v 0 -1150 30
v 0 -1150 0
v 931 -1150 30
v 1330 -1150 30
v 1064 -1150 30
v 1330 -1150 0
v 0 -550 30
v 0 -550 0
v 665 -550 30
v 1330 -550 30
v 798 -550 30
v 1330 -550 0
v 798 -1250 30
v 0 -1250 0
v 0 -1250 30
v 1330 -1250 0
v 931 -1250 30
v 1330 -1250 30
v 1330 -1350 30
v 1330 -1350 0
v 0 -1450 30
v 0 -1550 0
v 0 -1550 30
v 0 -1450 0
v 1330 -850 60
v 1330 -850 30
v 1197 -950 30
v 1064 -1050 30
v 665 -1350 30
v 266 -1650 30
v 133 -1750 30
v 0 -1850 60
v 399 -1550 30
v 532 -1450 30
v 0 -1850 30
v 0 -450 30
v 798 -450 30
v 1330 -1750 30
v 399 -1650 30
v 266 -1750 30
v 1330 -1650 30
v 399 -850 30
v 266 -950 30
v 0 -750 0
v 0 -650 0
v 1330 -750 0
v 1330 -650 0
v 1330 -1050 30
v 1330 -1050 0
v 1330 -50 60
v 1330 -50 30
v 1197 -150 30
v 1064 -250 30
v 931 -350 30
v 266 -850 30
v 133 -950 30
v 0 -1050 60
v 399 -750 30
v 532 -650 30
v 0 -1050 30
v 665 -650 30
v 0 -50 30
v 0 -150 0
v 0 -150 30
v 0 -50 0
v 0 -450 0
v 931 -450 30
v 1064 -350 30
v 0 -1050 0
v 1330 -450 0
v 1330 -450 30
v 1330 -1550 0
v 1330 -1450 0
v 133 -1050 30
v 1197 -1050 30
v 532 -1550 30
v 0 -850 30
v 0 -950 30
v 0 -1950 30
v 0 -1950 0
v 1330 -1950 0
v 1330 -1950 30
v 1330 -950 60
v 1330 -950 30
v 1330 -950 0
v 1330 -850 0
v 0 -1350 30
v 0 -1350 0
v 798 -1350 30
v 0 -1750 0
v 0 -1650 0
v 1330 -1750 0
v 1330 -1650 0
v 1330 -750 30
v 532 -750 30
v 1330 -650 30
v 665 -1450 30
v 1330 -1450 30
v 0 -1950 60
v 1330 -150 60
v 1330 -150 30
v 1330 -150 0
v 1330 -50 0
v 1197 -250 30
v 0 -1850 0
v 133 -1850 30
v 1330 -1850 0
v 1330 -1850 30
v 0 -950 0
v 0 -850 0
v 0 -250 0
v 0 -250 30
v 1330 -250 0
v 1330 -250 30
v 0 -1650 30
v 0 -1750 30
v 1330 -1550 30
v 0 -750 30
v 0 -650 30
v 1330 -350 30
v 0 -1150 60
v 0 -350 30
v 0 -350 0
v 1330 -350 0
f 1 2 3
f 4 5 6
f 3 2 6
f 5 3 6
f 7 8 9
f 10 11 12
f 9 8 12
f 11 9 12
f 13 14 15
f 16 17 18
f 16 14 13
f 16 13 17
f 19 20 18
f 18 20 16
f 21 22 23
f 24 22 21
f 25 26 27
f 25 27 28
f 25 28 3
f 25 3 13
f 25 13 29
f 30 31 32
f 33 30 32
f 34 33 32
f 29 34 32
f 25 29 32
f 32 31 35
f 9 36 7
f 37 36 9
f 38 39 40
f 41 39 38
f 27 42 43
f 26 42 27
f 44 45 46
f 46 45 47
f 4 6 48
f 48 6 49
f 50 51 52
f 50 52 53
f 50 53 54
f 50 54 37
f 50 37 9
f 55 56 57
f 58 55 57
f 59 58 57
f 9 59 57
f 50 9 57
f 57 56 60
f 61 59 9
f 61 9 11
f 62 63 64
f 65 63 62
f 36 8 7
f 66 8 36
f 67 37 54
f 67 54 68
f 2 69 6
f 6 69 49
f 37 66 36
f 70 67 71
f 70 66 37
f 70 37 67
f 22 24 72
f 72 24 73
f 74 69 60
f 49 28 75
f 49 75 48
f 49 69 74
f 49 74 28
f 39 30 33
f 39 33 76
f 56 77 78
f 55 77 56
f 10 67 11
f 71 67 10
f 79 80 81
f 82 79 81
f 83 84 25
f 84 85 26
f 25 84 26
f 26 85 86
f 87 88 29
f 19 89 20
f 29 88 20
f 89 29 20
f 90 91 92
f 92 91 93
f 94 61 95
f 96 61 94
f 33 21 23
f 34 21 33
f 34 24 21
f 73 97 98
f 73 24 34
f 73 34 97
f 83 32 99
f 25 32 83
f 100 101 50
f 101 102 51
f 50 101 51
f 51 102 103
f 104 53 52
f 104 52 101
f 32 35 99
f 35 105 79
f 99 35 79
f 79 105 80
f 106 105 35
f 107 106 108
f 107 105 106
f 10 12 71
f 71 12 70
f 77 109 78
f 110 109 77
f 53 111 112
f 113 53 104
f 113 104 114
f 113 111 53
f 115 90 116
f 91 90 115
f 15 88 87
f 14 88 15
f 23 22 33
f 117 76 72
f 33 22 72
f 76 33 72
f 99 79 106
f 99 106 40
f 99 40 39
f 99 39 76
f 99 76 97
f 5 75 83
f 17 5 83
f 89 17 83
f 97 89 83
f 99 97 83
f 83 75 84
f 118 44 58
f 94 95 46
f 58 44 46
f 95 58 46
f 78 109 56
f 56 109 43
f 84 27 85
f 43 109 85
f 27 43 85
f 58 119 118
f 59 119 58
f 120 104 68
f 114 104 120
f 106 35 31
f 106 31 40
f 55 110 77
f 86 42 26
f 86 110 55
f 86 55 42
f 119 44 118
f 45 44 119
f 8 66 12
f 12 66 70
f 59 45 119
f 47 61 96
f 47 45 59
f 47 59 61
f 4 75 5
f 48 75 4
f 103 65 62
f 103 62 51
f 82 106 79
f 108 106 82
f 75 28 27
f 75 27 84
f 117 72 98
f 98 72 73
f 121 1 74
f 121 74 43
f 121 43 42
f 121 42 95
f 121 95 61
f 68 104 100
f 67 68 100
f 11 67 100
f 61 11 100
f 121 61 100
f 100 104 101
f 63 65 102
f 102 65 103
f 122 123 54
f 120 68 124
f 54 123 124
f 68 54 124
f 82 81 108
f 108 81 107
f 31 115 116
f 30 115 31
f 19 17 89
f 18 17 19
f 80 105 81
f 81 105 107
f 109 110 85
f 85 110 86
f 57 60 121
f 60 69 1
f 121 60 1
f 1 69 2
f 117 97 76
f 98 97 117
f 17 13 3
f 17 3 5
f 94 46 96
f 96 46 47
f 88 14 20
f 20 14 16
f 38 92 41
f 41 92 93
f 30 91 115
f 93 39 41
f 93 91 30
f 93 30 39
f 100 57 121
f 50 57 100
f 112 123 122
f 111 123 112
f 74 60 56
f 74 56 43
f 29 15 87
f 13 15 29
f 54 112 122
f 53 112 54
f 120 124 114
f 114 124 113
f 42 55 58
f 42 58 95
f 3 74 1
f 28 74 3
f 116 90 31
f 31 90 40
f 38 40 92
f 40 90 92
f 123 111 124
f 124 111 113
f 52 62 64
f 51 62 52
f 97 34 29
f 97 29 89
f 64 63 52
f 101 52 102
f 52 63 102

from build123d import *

# Parameters (mm, degrees)
SKETCH1_W              = 1330
SKETCH1_H              = 100
BOSS_EXTRUDE1_DEPTH    = 30
BOSS_EXTRUDE1_2_DEPTH  = 30
BOSS_EXTRUDE1_3_DEPTH  = 30
BOSS_EXTRUDE1_4_DEPTH  = 30
BOSS_EXTRUDE1_5_DEPTH  = 30
BOSS_EXTRUDE1_6_DEPTH  = 30
BOSS_EXTRUDE1_7_DEPTH  = 30
BOSS_EXTRUDE1_8_DEPTH  = 30
BOSS_EXTRUDE1_9_DEPTH  = 30
BOSS_EXTRUDE1_10_DEPTH = 30
BOSS_EXTRUDE2_DEPTH    = 30


with BuildPart() as part:
    # Sketch1 → Boss-Extrude1 (new body)
    with BuildSketch(Plane.XY):
        with Locations((665, -500)):
            Rectangle(SKETCH1_W, SKETCH1_H)
    extrude(amount=BOSS_EXTRUDE1_DEPTH)



with BuildPart() as body_2:
    # Sketch1 → Boss-Extrude1 2 (new body)
    with BuildSketch(Plane.XY):
        with Locations((665, -700)):
            Rectangle(SKETCH1_W, SKETCH1_H)
    extrude(amount=BOSS_EXTRUDE1_2_DEPTH)


with BuildPart() as body_3:
    # Sketch1 → Boss-Extrude1 3 (new body)
    with BuildSketch(Plane.XY):
        with Locations((665, -900)):
            Rectangle(SKETCH1_W, SKETCH1_H)
    extrude(amount=BOSS_EXTRUDE1_3_DEPTH)


with BuildPart() as body_4:
    # Sketch1 → Boss-Extrude1 4 (new body)
    with BuildSketch(Plane.XY):
        with Locations((665, -1100)):
            Rectangle(SKETCH1_W, SKETCH1_H)
    extrude(amount=BOSS_EXTRUDE1_4_DEPTH)


with BuildPart() as body_5:
    # Sketch1 → Boss-Extrude1 5 (new body)
    with BuildSketch(Plane.XY):
        with Locations((665, -1300)):
            Rectangle(SKETCH1_W, SKETCH1_H)
    extrude(amount=BOSS_EXTRUDE1_5_DEPTH)


with BuildPart() as body_6:
    # Sketch1 → Boss-Extrude1 6 (new body)
    with BuildSketch(Plane.XY):
        with Locations((665, -1900)):
            Rectangle(SKETCH1_W, SKETCH1_H)
    extrude(amount=BOSS_EXTRUDE1_6_DEPTH)


with BuildPart() as body_7:
    # Sketch1 → Boss-Extrude1 7 (new body)
    with BuildSketch(Plane.XY):
        with Locations((665, -100)):
            Rectangle(SKETCH1_W, SKETCH1_H)
    extrude(amount=BOSS_EXTRUDE1_7_DEPTH)


with BuildPart() as body_8:
    # Sketch1 → Boss-Extrude1 8 (new body)
    with BuildSketch(Plane.XY):
        with Locations((665, -300)):
            Rectangle(SKETCH1_W, SKETCH1_H)
    extrude(amount=BOSS_EXTRUDE1_8_DEPTH)


with BuildPart() as body_9:
    # Sketch1 → Boss-Extrude1 9 (new body)
    with BuildSketch(Plane.XY):
        with Locations((665, -1500)):
            Rectangle(SKETCH1_W, SKETCH1_H)
    extrude(amount=BOSS_EXTRUDE1_9_DEPTH)


with BuildPart() as body_10:
    # Sketch1 → Boss-Extrude1 10 (new body)
    with BuildSketch(Plane.XY):
        with Locations((665, -1700)):
            Rectangle(SKETCH1_W, SKETCH1_H)
    extrude(amount=BOSS_EXTRUDE1_10_DEPTH)


with BuildPart() as part_1:
    add(part.part)

    add(body_2.part)  # Boss-Extrude2 merges body 2

    add(body_3.part)  # Boss-Extrude2 merges body 3

    add(body_4.part)  # Boss-Extrude2 merges body 4

    add(body_5.part)  # Boss-Extrude2 merges body 5

    add(body_6.part)  # Boss-Extrude2 merges body 6

    add(body_7.part)  # Boss-Extrude2 merges body 7

    add(body_8.part)  # Boss-Extrude2 merges body 8

    add(body_9.part)  # Boss-Extrude2 merges body 9

    add(body_10.part)  # Boss-Extrude2 merges body 10
    # Sketch2 → Boss-Extrude2 (add)
    with BuildSketch(Plane.XY.offset(30)):
        Polygon((1330, -50), (0, -1050), (0, -1150), (1330, -150), align=None)
        Polygon((1330, -850), (0, -1850), (0, -1950), (1330, -950), align=None)
    extrude(amount=BOSS_EXTRUDE2_DEPTH)


solid = part_1.part
